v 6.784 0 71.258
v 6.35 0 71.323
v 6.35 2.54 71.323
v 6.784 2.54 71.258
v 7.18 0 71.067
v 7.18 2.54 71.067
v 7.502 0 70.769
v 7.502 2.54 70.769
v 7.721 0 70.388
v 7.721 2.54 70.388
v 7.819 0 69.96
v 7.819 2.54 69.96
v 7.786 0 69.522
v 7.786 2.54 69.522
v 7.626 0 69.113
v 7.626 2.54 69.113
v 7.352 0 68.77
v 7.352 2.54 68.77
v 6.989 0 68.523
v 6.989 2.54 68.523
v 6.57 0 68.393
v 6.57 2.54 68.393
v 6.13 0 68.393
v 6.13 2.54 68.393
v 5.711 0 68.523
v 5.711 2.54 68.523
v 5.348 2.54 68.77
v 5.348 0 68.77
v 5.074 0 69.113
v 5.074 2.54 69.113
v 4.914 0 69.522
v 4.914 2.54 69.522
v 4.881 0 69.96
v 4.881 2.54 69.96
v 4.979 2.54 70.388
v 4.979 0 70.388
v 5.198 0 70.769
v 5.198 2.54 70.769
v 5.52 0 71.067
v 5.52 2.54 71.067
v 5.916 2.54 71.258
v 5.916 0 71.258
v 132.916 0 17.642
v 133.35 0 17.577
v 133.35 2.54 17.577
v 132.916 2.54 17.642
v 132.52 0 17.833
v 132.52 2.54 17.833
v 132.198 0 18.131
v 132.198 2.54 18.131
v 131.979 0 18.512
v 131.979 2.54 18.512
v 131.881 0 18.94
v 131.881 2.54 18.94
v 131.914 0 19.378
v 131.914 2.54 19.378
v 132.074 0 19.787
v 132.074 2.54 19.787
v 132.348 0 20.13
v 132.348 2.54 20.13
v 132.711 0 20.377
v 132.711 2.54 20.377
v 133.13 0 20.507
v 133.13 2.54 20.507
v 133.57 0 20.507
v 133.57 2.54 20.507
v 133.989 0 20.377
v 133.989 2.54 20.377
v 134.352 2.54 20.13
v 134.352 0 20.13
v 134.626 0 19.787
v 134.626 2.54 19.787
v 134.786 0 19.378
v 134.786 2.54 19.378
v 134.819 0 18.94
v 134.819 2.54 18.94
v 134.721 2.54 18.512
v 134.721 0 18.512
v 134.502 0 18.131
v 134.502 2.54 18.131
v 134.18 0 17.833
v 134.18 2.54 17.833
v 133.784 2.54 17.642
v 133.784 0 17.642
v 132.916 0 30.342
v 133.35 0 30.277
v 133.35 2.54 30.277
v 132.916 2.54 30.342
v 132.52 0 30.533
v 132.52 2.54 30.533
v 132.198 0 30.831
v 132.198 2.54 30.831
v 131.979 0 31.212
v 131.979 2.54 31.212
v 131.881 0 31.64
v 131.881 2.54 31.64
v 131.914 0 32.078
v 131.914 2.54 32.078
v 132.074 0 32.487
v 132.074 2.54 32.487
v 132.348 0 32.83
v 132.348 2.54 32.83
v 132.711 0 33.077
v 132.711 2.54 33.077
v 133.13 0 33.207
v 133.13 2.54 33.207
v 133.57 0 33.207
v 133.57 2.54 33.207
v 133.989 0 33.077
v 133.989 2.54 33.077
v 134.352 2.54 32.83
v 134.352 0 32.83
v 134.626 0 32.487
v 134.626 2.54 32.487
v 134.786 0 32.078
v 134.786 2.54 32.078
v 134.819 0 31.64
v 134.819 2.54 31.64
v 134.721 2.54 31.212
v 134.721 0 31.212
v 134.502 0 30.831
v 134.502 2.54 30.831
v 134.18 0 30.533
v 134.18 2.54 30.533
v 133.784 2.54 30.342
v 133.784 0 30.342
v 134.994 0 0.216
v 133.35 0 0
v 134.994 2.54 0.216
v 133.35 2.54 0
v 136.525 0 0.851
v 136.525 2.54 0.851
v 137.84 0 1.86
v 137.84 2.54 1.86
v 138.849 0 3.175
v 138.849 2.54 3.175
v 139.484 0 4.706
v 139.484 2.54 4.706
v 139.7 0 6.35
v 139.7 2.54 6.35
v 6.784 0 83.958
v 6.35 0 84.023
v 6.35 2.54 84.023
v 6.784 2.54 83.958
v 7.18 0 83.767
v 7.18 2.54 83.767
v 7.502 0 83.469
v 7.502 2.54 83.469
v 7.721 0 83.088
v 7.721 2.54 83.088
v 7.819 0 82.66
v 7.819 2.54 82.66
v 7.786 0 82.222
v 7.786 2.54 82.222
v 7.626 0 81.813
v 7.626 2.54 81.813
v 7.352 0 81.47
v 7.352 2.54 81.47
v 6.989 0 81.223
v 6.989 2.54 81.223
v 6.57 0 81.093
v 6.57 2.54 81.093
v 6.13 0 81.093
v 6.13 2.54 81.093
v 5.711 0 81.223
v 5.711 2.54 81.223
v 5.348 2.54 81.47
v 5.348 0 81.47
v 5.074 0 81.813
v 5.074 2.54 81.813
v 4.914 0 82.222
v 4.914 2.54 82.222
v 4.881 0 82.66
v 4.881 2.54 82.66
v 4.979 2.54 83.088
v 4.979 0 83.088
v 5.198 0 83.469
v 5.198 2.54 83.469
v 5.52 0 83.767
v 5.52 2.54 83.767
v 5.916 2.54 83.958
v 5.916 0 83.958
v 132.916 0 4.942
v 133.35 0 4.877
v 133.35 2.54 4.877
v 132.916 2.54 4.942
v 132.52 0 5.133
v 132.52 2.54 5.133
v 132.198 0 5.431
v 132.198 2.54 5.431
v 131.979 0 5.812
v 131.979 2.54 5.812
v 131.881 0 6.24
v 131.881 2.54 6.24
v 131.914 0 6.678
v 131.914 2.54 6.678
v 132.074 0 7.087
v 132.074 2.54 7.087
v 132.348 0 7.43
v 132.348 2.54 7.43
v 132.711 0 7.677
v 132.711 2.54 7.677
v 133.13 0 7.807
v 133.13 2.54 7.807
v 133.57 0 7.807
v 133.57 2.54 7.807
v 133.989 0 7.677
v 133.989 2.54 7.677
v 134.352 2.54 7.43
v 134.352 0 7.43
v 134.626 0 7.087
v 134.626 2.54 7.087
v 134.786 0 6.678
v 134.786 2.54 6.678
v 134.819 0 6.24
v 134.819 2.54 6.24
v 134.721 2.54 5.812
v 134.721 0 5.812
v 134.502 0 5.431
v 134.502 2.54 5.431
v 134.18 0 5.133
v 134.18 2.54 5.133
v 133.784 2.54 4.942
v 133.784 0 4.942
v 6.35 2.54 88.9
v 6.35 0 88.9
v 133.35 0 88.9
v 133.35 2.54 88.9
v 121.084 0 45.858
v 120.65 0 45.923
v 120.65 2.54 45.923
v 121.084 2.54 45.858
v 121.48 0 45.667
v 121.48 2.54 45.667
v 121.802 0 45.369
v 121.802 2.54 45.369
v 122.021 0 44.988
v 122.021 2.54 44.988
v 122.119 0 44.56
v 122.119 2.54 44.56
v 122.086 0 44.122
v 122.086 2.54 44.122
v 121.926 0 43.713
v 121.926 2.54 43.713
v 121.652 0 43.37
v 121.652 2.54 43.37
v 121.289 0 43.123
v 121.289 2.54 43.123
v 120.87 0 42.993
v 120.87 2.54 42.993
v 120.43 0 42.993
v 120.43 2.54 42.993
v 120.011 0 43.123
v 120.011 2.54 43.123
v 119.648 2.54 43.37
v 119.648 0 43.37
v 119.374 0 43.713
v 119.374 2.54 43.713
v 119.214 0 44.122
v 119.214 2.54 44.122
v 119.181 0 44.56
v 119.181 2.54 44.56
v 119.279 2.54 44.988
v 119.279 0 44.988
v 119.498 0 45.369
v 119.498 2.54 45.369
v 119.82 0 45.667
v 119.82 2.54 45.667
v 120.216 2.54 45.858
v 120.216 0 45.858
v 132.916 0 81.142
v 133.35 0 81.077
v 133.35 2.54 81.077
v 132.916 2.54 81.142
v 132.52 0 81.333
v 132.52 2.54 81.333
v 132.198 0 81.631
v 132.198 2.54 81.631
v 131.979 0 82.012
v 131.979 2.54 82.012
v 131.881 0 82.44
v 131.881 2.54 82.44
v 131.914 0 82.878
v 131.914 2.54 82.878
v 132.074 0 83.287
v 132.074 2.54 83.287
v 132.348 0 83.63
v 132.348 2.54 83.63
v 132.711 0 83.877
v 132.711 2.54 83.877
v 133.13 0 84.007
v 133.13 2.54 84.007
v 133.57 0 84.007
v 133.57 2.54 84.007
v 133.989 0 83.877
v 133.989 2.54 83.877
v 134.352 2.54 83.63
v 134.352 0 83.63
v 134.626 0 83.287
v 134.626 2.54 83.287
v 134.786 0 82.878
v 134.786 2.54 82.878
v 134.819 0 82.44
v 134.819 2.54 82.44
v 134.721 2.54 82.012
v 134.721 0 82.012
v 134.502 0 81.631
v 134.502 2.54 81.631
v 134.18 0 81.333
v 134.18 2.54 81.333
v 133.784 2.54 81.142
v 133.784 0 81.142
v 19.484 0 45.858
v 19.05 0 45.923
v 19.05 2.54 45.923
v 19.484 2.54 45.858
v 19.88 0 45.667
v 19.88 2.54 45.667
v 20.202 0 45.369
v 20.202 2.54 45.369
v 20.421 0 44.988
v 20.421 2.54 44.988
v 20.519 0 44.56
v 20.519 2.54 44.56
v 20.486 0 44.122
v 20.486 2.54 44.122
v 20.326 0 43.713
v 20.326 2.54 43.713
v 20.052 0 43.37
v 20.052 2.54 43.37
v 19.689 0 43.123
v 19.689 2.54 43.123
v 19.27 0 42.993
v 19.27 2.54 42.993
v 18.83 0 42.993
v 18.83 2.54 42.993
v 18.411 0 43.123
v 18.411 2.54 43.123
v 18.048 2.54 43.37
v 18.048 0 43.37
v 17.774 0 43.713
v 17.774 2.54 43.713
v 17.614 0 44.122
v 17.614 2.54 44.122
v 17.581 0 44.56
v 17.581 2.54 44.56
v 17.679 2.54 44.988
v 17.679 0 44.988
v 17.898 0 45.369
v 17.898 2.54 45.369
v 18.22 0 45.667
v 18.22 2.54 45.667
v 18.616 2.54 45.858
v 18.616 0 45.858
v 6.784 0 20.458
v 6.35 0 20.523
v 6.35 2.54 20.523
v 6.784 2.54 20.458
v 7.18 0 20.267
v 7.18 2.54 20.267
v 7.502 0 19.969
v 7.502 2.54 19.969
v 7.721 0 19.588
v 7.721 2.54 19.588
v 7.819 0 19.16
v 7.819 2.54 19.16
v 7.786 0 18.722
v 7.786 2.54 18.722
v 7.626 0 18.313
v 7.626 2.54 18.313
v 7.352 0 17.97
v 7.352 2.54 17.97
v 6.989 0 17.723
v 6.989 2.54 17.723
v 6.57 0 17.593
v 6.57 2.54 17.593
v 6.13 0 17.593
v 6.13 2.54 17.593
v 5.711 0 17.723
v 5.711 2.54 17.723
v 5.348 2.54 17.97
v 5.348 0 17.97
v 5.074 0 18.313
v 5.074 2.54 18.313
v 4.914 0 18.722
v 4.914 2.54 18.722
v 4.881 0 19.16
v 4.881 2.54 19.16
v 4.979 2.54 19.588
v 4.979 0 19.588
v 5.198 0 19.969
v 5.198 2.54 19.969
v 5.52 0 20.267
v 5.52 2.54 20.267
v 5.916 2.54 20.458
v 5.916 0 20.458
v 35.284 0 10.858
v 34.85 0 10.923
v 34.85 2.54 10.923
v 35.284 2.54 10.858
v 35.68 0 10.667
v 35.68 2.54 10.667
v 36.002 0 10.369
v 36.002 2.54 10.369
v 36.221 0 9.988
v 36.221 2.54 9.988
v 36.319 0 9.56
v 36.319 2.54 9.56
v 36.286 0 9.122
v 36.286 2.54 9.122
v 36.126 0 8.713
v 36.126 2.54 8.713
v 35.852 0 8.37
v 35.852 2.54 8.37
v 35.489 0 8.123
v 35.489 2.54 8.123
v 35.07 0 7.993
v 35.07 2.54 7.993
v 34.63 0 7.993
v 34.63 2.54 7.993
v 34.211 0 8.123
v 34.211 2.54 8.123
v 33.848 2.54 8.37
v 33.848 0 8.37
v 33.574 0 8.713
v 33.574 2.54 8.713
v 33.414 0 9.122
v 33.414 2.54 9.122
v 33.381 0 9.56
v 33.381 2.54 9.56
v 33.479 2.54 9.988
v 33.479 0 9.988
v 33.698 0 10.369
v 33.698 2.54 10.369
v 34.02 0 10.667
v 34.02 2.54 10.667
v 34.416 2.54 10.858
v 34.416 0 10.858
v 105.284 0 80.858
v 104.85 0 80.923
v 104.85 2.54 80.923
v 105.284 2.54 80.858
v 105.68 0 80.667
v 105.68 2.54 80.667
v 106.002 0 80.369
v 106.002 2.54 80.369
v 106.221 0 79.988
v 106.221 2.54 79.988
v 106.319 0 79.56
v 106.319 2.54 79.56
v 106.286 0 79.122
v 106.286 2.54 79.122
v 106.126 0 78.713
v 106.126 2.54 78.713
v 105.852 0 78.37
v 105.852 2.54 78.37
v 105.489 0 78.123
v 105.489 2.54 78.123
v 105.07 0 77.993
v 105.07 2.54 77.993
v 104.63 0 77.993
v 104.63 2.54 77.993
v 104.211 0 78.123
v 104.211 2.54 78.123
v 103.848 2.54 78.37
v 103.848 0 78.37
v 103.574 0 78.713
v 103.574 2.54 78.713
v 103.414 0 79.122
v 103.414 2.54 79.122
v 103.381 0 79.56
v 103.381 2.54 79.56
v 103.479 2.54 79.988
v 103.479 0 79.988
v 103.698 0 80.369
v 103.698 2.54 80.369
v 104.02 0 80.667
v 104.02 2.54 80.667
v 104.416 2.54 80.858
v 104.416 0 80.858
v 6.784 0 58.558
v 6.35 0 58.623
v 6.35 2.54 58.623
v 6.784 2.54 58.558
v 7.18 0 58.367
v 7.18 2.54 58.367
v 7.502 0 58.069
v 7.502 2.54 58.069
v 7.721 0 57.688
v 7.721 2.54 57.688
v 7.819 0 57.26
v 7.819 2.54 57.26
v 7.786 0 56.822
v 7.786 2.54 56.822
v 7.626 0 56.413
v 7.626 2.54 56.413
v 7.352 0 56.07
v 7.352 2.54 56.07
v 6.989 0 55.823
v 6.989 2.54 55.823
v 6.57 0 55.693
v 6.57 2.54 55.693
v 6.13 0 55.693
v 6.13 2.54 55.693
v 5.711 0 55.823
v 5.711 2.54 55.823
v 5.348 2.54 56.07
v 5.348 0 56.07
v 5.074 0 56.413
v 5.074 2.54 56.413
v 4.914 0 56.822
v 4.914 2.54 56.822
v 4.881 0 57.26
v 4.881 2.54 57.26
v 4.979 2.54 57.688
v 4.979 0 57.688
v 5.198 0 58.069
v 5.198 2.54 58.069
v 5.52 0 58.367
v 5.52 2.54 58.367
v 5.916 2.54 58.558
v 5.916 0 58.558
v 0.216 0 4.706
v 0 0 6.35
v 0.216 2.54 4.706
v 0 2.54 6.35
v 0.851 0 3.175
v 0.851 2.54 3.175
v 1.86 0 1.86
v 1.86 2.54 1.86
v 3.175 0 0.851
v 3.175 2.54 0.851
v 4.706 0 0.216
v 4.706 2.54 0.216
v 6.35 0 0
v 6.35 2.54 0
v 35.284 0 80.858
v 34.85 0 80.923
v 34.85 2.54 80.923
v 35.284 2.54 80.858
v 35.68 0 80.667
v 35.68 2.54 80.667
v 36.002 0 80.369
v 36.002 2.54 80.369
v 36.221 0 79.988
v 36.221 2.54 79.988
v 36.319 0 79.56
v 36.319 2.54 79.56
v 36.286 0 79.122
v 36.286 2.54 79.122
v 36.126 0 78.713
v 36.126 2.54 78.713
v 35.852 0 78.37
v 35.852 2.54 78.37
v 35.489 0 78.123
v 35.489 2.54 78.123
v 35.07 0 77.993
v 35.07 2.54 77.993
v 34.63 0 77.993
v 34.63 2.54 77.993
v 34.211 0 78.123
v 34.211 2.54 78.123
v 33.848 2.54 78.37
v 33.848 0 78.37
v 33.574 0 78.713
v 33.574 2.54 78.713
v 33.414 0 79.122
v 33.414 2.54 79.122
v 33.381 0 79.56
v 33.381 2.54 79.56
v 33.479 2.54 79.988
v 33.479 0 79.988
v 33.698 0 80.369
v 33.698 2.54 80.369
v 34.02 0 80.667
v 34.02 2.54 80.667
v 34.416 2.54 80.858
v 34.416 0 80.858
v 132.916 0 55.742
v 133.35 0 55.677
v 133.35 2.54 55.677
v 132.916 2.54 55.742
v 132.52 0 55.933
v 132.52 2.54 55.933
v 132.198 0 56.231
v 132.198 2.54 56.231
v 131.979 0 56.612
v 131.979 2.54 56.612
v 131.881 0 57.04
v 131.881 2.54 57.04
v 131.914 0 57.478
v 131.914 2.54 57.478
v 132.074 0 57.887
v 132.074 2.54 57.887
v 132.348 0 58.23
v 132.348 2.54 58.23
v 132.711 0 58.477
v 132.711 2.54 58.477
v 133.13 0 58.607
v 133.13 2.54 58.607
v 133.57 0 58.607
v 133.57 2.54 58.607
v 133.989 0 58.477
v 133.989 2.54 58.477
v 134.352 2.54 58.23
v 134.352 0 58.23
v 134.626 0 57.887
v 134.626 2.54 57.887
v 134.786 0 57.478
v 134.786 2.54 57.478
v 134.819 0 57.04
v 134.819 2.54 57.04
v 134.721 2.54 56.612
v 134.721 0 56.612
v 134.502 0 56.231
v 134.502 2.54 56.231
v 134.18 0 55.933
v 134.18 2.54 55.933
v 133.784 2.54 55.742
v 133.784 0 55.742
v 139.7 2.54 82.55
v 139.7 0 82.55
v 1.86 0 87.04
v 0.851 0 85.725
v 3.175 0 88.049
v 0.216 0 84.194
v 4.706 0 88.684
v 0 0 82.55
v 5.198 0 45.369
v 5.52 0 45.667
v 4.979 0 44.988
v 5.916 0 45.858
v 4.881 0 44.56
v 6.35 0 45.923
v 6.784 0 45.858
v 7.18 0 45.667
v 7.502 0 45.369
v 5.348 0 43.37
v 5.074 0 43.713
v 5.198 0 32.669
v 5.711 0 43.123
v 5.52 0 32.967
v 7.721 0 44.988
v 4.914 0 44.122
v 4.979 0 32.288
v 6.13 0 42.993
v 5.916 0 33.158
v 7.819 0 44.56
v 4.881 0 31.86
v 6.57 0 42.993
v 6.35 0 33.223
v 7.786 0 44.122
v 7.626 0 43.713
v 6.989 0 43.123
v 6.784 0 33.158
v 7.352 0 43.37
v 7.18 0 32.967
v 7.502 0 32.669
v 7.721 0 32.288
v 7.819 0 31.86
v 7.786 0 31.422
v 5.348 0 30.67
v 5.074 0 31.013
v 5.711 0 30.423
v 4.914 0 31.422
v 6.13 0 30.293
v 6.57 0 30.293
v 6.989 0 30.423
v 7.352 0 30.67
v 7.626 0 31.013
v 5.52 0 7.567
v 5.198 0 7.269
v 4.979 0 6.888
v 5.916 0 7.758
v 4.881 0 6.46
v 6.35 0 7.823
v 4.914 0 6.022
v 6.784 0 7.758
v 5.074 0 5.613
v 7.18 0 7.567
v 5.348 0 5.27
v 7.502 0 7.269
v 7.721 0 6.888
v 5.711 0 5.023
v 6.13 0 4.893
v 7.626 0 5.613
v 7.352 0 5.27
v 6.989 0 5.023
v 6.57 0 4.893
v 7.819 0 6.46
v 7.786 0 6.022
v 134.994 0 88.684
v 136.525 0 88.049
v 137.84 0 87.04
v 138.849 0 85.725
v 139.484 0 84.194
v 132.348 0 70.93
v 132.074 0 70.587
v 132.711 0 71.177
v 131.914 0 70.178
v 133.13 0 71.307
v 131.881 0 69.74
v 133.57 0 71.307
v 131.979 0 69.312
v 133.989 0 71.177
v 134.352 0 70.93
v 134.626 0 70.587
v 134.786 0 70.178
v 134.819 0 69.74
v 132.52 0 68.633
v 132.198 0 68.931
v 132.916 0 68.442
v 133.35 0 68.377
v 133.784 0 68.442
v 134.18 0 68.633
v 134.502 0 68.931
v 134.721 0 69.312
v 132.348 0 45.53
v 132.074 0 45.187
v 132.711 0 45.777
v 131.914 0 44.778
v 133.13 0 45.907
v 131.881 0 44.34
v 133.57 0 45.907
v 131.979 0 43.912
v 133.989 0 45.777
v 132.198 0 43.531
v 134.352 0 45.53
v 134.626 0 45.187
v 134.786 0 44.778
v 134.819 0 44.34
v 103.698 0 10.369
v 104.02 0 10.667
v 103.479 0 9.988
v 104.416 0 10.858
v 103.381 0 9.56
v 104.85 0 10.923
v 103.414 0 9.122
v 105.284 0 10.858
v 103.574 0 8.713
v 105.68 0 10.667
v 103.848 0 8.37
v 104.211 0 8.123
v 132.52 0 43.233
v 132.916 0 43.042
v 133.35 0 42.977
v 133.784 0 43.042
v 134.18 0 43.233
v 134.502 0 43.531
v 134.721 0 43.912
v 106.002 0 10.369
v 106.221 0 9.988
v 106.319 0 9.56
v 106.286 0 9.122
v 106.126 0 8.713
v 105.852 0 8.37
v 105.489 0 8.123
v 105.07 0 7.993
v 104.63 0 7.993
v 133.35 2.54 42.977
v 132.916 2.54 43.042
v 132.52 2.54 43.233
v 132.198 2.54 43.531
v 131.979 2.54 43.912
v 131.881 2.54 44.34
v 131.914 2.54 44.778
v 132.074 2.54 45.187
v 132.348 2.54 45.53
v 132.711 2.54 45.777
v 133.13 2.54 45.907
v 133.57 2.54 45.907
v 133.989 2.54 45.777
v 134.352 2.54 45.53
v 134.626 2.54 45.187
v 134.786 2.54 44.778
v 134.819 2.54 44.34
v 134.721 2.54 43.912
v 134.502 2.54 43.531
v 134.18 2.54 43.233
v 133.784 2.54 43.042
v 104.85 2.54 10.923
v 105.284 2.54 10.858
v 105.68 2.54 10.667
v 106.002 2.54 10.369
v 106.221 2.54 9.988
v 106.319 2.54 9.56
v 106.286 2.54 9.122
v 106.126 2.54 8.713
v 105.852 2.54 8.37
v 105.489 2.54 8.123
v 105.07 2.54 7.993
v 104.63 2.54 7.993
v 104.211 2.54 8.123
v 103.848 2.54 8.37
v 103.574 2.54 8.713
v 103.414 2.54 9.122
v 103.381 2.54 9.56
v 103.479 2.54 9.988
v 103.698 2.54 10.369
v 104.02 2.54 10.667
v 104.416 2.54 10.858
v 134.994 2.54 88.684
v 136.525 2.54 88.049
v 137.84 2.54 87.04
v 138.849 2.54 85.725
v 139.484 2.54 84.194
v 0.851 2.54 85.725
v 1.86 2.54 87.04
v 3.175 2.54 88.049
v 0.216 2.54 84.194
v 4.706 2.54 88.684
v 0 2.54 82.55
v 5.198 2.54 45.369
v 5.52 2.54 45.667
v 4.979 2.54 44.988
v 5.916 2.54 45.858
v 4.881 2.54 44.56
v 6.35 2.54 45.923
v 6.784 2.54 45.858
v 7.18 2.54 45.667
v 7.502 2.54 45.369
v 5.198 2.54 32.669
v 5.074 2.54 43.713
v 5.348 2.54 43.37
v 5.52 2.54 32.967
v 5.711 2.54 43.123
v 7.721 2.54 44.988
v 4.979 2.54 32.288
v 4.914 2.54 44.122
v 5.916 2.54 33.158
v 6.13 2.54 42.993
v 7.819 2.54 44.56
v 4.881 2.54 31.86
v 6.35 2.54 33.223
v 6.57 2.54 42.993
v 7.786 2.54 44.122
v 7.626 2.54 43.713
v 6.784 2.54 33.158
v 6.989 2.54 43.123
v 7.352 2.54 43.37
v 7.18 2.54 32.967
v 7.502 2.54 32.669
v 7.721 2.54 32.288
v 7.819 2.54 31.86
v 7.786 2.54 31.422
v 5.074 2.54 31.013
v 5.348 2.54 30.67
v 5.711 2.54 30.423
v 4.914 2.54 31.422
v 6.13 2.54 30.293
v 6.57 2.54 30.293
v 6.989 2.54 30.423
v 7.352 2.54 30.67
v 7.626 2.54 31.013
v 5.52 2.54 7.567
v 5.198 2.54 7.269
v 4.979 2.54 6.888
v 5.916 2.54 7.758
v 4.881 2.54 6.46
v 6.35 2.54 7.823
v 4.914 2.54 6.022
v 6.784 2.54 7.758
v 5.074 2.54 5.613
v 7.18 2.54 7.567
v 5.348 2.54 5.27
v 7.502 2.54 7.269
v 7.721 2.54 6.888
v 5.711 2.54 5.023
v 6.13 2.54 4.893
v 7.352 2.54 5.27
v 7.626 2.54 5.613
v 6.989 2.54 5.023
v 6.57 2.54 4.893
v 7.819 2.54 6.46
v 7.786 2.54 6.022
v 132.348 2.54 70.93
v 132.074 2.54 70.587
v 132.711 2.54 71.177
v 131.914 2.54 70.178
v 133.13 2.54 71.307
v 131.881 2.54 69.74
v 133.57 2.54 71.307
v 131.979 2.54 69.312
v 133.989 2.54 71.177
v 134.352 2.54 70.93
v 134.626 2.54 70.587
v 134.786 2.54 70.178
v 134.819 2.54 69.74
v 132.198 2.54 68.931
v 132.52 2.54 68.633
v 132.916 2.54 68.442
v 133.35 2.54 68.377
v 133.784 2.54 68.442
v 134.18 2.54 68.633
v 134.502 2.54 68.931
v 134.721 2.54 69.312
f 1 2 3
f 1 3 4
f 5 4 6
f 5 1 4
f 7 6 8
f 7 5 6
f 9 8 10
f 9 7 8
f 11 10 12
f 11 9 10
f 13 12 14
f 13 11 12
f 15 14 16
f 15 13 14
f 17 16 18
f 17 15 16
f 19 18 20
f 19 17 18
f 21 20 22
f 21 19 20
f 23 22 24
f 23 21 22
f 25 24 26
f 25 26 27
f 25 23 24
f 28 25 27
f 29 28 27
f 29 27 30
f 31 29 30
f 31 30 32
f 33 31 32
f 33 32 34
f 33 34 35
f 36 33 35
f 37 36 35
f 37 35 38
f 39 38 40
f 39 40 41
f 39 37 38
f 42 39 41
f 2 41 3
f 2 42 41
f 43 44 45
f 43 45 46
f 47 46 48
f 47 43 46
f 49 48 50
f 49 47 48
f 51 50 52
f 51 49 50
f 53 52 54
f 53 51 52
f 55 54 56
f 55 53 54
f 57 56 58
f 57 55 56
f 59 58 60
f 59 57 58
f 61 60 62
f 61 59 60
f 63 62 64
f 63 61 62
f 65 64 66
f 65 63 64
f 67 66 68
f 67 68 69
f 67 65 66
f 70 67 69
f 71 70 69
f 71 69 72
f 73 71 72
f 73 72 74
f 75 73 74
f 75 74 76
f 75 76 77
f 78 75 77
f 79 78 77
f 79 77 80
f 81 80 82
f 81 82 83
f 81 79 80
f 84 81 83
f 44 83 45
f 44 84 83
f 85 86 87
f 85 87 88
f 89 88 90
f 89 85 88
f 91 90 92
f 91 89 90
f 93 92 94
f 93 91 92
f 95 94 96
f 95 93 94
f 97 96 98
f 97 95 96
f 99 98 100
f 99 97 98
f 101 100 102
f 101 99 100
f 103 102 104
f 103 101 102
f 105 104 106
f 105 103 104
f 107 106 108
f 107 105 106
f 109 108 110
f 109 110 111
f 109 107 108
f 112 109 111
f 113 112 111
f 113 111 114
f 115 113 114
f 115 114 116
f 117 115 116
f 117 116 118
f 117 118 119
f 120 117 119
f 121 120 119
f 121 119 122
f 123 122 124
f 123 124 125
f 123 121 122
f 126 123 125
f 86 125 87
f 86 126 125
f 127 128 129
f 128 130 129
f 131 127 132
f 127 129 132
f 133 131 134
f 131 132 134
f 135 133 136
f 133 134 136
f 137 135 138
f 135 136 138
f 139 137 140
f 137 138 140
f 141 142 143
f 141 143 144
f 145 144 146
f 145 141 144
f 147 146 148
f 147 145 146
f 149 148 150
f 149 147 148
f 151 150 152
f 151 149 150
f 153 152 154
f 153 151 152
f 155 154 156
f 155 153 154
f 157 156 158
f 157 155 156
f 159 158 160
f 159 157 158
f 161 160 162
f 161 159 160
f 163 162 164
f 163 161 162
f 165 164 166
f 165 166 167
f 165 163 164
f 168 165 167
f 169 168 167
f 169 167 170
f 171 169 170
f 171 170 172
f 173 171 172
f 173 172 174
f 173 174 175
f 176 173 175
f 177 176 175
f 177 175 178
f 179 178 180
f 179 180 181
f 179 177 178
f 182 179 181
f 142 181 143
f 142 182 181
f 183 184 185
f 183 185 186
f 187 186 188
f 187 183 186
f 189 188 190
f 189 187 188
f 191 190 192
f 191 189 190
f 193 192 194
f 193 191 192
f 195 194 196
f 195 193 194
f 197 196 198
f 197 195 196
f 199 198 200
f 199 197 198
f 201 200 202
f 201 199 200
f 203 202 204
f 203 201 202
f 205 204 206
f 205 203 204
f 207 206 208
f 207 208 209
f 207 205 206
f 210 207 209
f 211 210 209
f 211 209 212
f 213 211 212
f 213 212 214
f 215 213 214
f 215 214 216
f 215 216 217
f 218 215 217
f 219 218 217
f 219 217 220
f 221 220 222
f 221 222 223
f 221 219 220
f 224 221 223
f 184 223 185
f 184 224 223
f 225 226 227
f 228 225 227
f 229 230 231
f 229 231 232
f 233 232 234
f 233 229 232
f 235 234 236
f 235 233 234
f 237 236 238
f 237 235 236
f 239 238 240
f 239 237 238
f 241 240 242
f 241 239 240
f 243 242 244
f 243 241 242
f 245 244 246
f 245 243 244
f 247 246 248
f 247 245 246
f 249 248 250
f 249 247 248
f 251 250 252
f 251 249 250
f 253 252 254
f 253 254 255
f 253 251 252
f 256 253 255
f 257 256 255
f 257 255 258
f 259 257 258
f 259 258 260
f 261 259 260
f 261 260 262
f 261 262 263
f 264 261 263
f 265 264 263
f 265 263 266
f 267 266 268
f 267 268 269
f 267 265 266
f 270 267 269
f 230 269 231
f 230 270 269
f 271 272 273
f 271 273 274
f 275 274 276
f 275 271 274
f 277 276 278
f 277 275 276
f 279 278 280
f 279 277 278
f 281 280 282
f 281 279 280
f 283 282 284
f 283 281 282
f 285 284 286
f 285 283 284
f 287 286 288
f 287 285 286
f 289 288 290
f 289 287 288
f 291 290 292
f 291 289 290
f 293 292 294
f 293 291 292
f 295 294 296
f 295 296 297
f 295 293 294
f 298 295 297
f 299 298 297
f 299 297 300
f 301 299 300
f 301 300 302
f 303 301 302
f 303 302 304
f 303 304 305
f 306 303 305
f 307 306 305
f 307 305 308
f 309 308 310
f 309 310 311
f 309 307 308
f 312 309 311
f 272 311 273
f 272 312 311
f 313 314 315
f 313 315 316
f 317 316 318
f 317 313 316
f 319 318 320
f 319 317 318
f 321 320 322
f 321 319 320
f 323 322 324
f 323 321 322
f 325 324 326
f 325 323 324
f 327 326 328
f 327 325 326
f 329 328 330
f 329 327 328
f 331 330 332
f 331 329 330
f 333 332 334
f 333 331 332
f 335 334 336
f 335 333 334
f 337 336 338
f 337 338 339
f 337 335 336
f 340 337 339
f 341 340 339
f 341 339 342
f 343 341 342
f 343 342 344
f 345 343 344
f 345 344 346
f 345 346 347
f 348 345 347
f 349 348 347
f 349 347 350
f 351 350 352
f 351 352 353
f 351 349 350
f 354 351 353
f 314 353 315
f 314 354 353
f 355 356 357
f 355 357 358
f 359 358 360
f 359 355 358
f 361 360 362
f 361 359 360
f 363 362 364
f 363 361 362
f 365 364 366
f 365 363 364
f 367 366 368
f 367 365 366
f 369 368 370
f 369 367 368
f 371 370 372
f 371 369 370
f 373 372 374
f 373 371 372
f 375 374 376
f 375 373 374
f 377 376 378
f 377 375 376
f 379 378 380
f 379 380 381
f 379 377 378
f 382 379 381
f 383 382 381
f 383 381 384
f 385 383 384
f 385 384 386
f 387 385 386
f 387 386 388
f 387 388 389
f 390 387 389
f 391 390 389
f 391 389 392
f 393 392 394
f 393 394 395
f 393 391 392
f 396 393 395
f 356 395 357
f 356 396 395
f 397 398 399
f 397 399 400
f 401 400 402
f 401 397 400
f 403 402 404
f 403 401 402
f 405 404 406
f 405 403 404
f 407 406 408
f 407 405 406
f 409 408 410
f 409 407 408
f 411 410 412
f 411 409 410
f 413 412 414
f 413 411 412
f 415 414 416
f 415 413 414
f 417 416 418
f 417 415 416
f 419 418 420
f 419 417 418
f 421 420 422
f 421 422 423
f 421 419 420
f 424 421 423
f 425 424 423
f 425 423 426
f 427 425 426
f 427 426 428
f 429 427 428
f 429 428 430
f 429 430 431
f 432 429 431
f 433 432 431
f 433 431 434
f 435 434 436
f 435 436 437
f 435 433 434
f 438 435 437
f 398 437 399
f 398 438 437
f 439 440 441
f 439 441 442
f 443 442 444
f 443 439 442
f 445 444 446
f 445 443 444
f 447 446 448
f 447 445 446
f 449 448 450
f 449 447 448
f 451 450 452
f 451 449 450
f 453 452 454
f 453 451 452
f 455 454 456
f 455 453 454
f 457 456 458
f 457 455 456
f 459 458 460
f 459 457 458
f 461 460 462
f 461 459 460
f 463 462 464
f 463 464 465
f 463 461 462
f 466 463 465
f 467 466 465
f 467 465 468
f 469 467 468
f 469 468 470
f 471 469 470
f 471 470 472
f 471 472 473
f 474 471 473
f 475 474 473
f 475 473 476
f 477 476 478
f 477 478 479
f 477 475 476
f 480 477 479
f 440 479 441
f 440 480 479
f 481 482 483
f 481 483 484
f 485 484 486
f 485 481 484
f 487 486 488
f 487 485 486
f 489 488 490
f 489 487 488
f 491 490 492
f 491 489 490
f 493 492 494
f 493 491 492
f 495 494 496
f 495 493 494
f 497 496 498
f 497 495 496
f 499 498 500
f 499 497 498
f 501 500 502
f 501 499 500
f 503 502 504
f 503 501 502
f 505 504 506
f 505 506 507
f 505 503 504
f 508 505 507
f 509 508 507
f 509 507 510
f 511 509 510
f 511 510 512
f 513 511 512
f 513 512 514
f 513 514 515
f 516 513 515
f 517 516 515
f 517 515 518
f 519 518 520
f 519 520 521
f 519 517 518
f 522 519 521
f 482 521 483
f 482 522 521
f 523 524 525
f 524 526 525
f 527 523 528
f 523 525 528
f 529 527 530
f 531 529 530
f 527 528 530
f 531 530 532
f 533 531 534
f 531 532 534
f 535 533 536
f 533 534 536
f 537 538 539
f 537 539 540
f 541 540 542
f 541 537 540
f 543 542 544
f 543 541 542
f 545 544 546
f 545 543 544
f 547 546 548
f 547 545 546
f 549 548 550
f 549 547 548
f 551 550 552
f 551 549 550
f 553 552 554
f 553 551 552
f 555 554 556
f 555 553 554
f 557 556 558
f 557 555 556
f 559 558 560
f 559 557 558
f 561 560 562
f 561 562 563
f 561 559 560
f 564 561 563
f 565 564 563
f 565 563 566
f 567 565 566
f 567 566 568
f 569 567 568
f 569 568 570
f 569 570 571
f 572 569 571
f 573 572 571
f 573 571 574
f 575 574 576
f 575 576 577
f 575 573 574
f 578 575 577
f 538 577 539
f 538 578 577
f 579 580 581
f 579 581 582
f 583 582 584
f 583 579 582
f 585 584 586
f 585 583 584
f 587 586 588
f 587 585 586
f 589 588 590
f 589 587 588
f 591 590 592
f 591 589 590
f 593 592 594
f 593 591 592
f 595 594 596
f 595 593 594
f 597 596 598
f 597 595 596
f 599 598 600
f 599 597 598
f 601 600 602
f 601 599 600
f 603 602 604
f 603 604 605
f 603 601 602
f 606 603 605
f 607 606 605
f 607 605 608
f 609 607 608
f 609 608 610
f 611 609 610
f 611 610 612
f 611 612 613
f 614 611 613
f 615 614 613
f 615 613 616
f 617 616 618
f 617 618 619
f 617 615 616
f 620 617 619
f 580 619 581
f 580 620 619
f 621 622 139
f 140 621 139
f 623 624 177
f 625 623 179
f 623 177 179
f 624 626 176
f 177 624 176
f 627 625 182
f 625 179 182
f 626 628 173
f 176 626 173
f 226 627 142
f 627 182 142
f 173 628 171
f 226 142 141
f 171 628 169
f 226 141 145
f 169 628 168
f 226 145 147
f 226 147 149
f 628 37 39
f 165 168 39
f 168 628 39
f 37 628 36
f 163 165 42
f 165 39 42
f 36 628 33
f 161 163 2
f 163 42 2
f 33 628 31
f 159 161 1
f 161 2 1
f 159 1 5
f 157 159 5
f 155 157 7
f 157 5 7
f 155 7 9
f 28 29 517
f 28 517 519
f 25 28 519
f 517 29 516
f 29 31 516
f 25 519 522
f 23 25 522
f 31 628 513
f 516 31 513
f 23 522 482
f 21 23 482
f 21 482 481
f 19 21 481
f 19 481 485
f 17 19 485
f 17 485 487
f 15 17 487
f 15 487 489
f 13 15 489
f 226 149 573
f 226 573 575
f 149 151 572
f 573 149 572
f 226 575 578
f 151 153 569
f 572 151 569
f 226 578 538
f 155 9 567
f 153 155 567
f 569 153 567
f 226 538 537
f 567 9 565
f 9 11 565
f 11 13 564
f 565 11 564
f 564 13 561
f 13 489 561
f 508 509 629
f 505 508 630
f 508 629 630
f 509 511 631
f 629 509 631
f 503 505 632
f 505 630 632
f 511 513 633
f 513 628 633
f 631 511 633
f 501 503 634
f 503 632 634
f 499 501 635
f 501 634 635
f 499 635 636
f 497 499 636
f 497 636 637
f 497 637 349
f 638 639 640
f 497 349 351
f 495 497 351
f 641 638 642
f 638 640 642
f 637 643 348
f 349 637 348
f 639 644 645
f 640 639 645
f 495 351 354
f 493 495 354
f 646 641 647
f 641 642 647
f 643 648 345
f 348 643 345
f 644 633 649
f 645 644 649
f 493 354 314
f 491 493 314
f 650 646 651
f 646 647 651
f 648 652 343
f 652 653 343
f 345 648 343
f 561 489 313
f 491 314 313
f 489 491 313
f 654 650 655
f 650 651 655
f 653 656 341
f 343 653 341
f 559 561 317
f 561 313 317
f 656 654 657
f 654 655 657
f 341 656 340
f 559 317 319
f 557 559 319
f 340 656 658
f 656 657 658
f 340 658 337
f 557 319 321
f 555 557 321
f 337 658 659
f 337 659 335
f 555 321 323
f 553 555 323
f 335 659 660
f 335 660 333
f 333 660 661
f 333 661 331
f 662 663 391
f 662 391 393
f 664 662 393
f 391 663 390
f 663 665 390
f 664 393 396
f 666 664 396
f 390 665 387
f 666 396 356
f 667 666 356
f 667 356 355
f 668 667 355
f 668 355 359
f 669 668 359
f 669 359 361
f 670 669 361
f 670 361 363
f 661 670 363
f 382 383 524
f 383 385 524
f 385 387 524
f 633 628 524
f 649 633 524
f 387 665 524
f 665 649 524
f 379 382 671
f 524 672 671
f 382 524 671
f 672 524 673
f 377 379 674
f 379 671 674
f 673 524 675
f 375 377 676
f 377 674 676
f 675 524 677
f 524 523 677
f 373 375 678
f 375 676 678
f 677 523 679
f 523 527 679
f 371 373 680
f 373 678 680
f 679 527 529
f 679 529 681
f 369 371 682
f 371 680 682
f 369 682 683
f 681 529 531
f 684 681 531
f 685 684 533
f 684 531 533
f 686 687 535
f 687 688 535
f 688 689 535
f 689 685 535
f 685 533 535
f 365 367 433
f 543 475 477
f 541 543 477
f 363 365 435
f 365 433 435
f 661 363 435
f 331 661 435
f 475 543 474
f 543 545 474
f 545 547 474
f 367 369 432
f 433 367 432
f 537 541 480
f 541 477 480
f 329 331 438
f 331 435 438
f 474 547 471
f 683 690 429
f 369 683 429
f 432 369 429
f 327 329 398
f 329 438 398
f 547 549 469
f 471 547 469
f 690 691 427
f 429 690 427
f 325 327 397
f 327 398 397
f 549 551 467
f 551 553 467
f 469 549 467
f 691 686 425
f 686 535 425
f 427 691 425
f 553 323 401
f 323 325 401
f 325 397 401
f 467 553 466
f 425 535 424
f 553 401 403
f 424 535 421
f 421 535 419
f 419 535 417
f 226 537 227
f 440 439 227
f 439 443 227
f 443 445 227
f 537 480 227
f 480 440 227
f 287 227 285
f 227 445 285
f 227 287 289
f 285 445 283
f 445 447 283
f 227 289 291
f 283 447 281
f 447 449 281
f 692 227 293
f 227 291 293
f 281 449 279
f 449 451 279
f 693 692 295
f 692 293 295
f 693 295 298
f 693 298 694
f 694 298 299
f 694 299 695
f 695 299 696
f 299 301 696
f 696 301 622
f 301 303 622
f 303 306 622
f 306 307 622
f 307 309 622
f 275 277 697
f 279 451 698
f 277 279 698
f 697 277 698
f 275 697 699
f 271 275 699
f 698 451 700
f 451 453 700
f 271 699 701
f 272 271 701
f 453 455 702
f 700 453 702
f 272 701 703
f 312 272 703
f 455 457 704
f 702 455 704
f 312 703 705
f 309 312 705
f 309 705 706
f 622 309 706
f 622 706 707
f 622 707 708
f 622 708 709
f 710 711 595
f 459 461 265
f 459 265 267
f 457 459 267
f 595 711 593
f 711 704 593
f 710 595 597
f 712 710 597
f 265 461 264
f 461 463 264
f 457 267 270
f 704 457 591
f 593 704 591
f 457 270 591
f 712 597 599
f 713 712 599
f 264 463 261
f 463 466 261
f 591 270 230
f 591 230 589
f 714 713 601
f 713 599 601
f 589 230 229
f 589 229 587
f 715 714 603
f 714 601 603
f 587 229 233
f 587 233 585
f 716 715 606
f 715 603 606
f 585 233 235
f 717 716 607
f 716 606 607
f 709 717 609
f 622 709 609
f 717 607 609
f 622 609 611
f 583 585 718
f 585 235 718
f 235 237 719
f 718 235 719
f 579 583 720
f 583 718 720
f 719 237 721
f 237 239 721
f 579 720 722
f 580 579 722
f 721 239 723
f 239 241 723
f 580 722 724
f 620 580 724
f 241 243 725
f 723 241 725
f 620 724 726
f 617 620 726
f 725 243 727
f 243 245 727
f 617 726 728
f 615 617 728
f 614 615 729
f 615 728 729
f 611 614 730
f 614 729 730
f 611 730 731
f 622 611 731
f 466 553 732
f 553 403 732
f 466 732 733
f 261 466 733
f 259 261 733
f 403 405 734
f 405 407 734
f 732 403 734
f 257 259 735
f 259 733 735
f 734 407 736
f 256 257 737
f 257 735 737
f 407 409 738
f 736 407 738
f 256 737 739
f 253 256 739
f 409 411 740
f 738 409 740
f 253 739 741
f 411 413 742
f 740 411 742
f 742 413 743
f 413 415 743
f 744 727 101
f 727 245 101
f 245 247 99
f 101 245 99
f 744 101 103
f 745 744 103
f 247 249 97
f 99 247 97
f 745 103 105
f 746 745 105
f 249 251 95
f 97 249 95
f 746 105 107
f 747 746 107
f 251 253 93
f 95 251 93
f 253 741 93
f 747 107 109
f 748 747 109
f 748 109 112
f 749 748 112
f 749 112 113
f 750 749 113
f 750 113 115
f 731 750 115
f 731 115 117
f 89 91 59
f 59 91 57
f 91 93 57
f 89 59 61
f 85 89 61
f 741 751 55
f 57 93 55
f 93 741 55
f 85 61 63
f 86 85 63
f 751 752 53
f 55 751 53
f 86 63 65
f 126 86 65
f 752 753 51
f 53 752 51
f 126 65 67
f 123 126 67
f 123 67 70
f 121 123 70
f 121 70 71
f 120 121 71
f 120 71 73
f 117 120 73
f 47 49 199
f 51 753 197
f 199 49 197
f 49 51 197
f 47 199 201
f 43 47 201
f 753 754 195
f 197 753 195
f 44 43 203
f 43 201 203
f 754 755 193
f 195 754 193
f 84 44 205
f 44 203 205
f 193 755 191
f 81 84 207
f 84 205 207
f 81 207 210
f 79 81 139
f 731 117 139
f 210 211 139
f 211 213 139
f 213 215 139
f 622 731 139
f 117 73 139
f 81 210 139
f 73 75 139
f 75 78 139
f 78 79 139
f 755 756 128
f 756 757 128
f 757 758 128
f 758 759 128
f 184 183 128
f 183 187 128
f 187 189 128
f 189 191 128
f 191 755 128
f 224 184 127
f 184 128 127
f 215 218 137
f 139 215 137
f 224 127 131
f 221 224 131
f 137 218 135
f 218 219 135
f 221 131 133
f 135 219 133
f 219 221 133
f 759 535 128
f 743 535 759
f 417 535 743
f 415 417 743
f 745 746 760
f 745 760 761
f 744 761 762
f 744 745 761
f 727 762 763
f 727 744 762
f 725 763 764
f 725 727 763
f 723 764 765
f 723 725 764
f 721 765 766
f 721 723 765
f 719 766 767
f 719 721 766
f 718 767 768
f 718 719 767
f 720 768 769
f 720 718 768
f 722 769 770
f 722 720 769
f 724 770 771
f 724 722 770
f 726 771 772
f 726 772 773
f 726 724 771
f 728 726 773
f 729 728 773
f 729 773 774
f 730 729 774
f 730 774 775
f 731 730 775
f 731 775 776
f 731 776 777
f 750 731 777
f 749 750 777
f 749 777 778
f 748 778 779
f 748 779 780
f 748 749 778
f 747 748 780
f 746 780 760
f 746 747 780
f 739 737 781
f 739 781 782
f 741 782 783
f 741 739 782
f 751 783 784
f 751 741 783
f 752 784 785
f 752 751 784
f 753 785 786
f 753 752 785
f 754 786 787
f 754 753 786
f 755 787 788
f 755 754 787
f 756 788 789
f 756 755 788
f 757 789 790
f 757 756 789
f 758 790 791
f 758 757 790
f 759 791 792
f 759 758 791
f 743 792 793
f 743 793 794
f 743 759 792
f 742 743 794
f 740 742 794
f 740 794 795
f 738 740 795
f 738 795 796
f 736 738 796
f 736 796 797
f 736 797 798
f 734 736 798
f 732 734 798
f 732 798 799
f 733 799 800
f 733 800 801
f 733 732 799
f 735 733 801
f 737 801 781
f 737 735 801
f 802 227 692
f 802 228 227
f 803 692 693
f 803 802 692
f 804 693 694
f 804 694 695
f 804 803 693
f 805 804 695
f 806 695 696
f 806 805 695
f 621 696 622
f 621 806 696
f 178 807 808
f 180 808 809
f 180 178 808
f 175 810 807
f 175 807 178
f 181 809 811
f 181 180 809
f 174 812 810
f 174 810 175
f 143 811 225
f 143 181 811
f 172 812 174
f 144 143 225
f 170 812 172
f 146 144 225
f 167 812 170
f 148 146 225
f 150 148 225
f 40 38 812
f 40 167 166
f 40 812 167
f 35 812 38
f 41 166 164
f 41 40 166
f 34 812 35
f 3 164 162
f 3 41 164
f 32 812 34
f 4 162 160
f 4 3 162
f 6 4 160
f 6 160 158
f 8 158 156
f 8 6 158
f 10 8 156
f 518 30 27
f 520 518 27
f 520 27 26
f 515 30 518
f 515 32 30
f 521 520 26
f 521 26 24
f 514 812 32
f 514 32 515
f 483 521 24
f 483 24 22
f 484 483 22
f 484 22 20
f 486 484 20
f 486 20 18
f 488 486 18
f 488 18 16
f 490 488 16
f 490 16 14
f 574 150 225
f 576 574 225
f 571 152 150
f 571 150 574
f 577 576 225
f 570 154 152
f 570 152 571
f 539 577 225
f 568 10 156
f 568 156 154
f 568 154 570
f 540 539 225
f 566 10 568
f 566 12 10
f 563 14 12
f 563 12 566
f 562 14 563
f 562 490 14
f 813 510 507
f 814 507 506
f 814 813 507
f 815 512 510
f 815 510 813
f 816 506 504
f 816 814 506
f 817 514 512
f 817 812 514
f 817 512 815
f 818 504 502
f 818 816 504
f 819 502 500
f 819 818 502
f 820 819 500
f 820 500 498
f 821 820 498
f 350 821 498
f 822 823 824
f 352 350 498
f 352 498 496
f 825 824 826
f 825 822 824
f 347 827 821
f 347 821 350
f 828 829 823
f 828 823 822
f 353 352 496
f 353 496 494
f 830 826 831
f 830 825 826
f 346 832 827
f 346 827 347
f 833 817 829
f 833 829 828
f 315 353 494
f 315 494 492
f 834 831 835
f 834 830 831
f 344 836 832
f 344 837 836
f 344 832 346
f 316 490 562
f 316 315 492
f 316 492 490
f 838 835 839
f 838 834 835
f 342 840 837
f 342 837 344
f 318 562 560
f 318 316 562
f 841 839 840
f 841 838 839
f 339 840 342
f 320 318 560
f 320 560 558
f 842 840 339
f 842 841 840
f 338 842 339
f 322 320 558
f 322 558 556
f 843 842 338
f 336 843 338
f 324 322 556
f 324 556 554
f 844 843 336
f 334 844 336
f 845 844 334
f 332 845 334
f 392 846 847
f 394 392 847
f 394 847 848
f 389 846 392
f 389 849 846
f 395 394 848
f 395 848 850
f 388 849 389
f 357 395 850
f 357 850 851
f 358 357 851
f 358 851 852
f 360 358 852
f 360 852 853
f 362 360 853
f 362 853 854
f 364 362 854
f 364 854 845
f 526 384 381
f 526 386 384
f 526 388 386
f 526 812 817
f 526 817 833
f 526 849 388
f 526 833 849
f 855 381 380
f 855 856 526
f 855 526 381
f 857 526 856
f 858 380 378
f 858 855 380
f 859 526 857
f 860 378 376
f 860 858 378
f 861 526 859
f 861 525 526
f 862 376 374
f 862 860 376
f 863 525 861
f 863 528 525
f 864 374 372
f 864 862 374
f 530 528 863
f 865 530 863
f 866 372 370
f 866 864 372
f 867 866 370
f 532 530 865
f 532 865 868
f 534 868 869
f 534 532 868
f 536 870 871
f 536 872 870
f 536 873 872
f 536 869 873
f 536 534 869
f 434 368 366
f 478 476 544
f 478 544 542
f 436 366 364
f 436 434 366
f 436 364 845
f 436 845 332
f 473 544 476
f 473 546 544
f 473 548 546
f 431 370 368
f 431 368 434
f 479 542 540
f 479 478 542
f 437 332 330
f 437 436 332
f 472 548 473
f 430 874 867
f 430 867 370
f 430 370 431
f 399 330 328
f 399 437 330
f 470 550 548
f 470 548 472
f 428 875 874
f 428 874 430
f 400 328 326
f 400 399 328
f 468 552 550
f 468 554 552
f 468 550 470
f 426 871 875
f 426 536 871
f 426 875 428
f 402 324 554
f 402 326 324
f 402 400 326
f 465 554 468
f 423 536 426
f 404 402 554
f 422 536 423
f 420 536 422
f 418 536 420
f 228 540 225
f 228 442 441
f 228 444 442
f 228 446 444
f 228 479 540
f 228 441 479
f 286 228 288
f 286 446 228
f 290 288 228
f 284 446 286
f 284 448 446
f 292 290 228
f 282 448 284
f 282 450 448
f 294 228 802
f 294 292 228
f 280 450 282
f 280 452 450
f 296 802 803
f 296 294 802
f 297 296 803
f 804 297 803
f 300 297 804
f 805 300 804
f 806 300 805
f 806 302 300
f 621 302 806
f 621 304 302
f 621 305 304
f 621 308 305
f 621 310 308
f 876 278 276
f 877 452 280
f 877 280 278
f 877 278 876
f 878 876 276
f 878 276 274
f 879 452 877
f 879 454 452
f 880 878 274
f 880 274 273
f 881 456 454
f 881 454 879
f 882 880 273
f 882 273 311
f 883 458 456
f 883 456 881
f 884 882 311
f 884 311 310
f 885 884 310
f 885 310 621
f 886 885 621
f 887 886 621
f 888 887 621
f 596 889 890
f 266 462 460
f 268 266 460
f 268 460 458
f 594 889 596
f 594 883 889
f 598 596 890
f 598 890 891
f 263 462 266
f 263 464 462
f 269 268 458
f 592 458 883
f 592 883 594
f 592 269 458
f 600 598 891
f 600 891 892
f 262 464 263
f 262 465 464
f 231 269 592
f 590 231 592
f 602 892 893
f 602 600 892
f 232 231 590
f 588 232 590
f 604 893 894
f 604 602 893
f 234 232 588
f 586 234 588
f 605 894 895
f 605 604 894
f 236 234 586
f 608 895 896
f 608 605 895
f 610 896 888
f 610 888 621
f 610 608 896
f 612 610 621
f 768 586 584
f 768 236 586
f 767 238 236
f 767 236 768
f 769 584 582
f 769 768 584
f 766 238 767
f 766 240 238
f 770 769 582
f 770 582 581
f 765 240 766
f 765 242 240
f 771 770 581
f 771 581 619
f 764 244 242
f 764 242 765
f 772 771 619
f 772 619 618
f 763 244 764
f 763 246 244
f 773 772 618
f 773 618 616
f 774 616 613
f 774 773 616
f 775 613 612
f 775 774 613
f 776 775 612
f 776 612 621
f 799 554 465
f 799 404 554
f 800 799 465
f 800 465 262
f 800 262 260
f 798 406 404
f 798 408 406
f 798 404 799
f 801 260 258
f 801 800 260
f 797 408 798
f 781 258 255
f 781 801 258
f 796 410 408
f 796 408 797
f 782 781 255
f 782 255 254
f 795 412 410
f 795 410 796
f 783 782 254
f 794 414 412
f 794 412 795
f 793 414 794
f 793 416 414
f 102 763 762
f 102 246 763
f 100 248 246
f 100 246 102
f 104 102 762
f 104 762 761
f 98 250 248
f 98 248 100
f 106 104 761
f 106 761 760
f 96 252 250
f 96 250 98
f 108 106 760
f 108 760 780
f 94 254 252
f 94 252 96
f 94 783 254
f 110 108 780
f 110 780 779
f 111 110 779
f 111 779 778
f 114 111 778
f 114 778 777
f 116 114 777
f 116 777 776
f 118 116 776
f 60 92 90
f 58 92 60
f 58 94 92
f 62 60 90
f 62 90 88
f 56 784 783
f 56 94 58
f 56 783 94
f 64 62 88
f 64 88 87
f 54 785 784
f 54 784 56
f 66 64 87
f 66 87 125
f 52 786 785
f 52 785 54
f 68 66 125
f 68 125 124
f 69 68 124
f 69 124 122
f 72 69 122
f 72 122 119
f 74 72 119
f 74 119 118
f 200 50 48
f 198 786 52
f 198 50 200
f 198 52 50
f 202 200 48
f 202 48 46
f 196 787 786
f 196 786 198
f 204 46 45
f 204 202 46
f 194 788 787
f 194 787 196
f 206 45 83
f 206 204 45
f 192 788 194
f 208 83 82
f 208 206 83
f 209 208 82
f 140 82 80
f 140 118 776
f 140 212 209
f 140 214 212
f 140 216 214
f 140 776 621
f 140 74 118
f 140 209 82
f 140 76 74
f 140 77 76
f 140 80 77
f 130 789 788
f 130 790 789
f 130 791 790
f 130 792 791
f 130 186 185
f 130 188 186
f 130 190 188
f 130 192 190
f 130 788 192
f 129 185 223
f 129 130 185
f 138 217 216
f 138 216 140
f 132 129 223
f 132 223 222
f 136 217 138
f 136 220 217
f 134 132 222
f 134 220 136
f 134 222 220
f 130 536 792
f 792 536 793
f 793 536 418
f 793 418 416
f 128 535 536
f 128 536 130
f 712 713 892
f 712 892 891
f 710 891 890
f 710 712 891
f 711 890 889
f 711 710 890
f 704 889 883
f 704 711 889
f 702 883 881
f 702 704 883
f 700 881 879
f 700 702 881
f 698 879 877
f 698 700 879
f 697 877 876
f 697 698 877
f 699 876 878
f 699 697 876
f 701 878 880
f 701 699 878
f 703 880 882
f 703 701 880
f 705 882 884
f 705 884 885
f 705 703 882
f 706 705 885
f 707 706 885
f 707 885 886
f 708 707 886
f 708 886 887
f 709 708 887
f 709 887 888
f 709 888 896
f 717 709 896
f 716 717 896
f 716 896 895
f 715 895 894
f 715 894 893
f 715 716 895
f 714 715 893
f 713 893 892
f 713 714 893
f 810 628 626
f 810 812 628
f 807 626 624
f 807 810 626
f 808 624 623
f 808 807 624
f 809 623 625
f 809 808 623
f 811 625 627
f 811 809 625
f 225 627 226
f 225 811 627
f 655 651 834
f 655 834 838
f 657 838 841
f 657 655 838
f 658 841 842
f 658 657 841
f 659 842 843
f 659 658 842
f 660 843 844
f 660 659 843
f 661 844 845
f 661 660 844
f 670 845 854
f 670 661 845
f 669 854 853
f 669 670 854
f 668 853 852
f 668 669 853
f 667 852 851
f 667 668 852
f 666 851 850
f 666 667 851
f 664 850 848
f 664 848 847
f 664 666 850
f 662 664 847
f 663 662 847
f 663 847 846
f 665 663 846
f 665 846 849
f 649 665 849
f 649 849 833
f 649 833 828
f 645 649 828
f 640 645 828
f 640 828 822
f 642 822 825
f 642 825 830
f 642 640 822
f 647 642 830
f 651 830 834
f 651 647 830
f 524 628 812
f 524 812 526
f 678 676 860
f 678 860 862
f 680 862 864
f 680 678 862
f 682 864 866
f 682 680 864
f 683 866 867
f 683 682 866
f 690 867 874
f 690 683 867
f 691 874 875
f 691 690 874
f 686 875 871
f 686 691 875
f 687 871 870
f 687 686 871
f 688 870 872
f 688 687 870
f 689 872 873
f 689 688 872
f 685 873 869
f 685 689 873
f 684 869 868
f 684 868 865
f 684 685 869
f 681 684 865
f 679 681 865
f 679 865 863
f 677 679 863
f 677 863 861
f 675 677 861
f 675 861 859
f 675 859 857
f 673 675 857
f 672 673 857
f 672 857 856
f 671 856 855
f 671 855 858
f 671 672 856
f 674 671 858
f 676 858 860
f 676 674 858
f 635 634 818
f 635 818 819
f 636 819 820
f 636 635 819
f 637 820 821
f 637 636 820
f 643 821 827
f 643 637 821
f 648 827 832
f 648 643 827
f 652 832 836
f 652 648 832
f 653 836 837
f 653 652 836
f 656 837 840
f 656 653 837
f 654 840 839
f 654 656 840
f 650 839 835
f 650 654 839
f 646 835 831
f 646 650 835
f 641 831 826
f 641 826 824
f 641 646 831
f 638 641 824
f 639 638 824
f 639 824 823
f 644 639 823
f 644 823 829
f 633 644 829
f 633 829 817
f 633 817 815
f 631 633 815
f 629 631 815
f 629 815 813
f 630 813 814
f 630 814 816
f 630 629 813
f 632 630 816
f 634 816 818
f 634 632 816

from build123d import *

# Parameters (mm, degrees)
SKETCH1_W           = 139.7
SKETCH1_H           = 88.9
SKETCH1_R           = 1.4732
BOSS_EXTRUDE1_DEPTH = 2.54
FILLET1_R           = 6.35


with BuildPart() as part:
    # Sketch1 → Boss-Extrude1 (new body)
    with BuildSketch(Plane(origin=(0, 0, 0), x_dir=(1, 0, 0), z_dir=(0, 1, 0))):
        with Locations((69.85, -44.45)):
            Rectangle(SKETCH1_W, SKETCH1_H)
        with Locations(Location((34.85, -9.45, 0), (0, 0, 270))):
            Circle(SKETCH1_R, mode=Mode.SUBTRACT)
        with Locations(Location((6.35, -6.35, 0), (0, 0, 270))):
            Circle(SKETCH1_R, mode=Mode.SUBTRACT)
        with Locations(Location((6.35, -19.05, 0), (0, 0, 270))):
            Circle(SKETCH1_R, mode=Mode.SUBTRACT)
        with Locations(Location((6.35, -31.75, 0), (0, 0, 270))):
            Circle(SKETCH1_R, mode=Mode.SUBTRACT)
        with Locations(Location((6.35, -44.45, 0), (0, 0, 270))):
            Circle(SKETCH1_R, mode=Mode.SUBTRACT)
        with Locations(Location((6.35, -57.15, 0), (0, 0, 270))):
            Circle(SKETCH1_R, mode=Mode.SUBTRACT)
        with Locations(Location((6.35, -69.85, 0), (0, 0, 270))):
            Circle(SKETCH1_R, mode=Mode.SUBTRACT)
        with Locations(Location((6.35, -82.55, 0), (0, 0, 270))):
            Circle(SKETCH1_R, mode=Mode.SUBTRACT)
        with Locations(Location((104.85, -9.45, 0), (0, 0, 270))):
            Circle(SKETCH1_R, mode=Mode.SUBTRACT)
        with Locations(Location((104.85, -79.45, 0), (0, 0, 270))):
            Circle(SKETCH1_R, mode=Mode.SUBTRACT)
        with Locations(Location((34.85, -79.45, 0), (0, 0, 270))):
            Circle(SKETCH1_R, mode=Mode.SUBTRACT)
        with Locations(Location((133.35, -82.55, 0), (0, 0, 90))):
            Circle(SKETCH1_R, mode=Mode.SUBTRACT)
        with Locations(Location((133.35, -69.85, 0), (0, 0, 90))):
            Circle(SKETCH1_R, mode=Mode.SUBTRACT)
        with Locations(Location((133.35, -57.15, 0), (0, 0, 90))):
            Circle(SKETCH1_R, mode=Mode.SUBTRACT)
        with Locations(Location((133.35, -44.45, 0), (0, 0, 90))):
            Circle(SKETCH1_R, mode=Mode.SUBTRACT)
        with Locations(Location((133.35, -31.75, 0), (0, 0, 90))):
            Circle(SKETCH1_R, mode=Mode.SUBTRACT)
        with Locations(Location((133.35, -19.05, 0), (0, 0, 90))):
            Circle(SKETCH1_R, mode=Mode.SUBTRACT)
        with Locations(Location((133.35, -6.35, 0), (0, 0, 90))):
            Circle(SKETCH1_R, mode=Mode.SUBTRACT)
        with Locations(Location((19.05, -44.45, 0), (0, 0, 270))):
            Circle(SKETCH1_R, mode=Mode.SUBTRACT)
        with Locations(Location((120.65, -44.45, 0), (0, 0, 270))):
            Circle(SKETCH1_R, mode=Mode.SUBTRACT)
    extrude(amount=BOSS_EXTRUDE1_DEPTH)

    # Fillet1
    fillet1_edges = [part.edges().sort_by_distance(p)[0] for p in [
        (0, 1.27, 0),
        (139.7, 1.27, 0),
        (139.7, 1.27, 88.9),
        (0, 1.27, 88.9),
    ]]
    fillet(fillet1_edges, radius=FILLET1_R)


solid = part.part
